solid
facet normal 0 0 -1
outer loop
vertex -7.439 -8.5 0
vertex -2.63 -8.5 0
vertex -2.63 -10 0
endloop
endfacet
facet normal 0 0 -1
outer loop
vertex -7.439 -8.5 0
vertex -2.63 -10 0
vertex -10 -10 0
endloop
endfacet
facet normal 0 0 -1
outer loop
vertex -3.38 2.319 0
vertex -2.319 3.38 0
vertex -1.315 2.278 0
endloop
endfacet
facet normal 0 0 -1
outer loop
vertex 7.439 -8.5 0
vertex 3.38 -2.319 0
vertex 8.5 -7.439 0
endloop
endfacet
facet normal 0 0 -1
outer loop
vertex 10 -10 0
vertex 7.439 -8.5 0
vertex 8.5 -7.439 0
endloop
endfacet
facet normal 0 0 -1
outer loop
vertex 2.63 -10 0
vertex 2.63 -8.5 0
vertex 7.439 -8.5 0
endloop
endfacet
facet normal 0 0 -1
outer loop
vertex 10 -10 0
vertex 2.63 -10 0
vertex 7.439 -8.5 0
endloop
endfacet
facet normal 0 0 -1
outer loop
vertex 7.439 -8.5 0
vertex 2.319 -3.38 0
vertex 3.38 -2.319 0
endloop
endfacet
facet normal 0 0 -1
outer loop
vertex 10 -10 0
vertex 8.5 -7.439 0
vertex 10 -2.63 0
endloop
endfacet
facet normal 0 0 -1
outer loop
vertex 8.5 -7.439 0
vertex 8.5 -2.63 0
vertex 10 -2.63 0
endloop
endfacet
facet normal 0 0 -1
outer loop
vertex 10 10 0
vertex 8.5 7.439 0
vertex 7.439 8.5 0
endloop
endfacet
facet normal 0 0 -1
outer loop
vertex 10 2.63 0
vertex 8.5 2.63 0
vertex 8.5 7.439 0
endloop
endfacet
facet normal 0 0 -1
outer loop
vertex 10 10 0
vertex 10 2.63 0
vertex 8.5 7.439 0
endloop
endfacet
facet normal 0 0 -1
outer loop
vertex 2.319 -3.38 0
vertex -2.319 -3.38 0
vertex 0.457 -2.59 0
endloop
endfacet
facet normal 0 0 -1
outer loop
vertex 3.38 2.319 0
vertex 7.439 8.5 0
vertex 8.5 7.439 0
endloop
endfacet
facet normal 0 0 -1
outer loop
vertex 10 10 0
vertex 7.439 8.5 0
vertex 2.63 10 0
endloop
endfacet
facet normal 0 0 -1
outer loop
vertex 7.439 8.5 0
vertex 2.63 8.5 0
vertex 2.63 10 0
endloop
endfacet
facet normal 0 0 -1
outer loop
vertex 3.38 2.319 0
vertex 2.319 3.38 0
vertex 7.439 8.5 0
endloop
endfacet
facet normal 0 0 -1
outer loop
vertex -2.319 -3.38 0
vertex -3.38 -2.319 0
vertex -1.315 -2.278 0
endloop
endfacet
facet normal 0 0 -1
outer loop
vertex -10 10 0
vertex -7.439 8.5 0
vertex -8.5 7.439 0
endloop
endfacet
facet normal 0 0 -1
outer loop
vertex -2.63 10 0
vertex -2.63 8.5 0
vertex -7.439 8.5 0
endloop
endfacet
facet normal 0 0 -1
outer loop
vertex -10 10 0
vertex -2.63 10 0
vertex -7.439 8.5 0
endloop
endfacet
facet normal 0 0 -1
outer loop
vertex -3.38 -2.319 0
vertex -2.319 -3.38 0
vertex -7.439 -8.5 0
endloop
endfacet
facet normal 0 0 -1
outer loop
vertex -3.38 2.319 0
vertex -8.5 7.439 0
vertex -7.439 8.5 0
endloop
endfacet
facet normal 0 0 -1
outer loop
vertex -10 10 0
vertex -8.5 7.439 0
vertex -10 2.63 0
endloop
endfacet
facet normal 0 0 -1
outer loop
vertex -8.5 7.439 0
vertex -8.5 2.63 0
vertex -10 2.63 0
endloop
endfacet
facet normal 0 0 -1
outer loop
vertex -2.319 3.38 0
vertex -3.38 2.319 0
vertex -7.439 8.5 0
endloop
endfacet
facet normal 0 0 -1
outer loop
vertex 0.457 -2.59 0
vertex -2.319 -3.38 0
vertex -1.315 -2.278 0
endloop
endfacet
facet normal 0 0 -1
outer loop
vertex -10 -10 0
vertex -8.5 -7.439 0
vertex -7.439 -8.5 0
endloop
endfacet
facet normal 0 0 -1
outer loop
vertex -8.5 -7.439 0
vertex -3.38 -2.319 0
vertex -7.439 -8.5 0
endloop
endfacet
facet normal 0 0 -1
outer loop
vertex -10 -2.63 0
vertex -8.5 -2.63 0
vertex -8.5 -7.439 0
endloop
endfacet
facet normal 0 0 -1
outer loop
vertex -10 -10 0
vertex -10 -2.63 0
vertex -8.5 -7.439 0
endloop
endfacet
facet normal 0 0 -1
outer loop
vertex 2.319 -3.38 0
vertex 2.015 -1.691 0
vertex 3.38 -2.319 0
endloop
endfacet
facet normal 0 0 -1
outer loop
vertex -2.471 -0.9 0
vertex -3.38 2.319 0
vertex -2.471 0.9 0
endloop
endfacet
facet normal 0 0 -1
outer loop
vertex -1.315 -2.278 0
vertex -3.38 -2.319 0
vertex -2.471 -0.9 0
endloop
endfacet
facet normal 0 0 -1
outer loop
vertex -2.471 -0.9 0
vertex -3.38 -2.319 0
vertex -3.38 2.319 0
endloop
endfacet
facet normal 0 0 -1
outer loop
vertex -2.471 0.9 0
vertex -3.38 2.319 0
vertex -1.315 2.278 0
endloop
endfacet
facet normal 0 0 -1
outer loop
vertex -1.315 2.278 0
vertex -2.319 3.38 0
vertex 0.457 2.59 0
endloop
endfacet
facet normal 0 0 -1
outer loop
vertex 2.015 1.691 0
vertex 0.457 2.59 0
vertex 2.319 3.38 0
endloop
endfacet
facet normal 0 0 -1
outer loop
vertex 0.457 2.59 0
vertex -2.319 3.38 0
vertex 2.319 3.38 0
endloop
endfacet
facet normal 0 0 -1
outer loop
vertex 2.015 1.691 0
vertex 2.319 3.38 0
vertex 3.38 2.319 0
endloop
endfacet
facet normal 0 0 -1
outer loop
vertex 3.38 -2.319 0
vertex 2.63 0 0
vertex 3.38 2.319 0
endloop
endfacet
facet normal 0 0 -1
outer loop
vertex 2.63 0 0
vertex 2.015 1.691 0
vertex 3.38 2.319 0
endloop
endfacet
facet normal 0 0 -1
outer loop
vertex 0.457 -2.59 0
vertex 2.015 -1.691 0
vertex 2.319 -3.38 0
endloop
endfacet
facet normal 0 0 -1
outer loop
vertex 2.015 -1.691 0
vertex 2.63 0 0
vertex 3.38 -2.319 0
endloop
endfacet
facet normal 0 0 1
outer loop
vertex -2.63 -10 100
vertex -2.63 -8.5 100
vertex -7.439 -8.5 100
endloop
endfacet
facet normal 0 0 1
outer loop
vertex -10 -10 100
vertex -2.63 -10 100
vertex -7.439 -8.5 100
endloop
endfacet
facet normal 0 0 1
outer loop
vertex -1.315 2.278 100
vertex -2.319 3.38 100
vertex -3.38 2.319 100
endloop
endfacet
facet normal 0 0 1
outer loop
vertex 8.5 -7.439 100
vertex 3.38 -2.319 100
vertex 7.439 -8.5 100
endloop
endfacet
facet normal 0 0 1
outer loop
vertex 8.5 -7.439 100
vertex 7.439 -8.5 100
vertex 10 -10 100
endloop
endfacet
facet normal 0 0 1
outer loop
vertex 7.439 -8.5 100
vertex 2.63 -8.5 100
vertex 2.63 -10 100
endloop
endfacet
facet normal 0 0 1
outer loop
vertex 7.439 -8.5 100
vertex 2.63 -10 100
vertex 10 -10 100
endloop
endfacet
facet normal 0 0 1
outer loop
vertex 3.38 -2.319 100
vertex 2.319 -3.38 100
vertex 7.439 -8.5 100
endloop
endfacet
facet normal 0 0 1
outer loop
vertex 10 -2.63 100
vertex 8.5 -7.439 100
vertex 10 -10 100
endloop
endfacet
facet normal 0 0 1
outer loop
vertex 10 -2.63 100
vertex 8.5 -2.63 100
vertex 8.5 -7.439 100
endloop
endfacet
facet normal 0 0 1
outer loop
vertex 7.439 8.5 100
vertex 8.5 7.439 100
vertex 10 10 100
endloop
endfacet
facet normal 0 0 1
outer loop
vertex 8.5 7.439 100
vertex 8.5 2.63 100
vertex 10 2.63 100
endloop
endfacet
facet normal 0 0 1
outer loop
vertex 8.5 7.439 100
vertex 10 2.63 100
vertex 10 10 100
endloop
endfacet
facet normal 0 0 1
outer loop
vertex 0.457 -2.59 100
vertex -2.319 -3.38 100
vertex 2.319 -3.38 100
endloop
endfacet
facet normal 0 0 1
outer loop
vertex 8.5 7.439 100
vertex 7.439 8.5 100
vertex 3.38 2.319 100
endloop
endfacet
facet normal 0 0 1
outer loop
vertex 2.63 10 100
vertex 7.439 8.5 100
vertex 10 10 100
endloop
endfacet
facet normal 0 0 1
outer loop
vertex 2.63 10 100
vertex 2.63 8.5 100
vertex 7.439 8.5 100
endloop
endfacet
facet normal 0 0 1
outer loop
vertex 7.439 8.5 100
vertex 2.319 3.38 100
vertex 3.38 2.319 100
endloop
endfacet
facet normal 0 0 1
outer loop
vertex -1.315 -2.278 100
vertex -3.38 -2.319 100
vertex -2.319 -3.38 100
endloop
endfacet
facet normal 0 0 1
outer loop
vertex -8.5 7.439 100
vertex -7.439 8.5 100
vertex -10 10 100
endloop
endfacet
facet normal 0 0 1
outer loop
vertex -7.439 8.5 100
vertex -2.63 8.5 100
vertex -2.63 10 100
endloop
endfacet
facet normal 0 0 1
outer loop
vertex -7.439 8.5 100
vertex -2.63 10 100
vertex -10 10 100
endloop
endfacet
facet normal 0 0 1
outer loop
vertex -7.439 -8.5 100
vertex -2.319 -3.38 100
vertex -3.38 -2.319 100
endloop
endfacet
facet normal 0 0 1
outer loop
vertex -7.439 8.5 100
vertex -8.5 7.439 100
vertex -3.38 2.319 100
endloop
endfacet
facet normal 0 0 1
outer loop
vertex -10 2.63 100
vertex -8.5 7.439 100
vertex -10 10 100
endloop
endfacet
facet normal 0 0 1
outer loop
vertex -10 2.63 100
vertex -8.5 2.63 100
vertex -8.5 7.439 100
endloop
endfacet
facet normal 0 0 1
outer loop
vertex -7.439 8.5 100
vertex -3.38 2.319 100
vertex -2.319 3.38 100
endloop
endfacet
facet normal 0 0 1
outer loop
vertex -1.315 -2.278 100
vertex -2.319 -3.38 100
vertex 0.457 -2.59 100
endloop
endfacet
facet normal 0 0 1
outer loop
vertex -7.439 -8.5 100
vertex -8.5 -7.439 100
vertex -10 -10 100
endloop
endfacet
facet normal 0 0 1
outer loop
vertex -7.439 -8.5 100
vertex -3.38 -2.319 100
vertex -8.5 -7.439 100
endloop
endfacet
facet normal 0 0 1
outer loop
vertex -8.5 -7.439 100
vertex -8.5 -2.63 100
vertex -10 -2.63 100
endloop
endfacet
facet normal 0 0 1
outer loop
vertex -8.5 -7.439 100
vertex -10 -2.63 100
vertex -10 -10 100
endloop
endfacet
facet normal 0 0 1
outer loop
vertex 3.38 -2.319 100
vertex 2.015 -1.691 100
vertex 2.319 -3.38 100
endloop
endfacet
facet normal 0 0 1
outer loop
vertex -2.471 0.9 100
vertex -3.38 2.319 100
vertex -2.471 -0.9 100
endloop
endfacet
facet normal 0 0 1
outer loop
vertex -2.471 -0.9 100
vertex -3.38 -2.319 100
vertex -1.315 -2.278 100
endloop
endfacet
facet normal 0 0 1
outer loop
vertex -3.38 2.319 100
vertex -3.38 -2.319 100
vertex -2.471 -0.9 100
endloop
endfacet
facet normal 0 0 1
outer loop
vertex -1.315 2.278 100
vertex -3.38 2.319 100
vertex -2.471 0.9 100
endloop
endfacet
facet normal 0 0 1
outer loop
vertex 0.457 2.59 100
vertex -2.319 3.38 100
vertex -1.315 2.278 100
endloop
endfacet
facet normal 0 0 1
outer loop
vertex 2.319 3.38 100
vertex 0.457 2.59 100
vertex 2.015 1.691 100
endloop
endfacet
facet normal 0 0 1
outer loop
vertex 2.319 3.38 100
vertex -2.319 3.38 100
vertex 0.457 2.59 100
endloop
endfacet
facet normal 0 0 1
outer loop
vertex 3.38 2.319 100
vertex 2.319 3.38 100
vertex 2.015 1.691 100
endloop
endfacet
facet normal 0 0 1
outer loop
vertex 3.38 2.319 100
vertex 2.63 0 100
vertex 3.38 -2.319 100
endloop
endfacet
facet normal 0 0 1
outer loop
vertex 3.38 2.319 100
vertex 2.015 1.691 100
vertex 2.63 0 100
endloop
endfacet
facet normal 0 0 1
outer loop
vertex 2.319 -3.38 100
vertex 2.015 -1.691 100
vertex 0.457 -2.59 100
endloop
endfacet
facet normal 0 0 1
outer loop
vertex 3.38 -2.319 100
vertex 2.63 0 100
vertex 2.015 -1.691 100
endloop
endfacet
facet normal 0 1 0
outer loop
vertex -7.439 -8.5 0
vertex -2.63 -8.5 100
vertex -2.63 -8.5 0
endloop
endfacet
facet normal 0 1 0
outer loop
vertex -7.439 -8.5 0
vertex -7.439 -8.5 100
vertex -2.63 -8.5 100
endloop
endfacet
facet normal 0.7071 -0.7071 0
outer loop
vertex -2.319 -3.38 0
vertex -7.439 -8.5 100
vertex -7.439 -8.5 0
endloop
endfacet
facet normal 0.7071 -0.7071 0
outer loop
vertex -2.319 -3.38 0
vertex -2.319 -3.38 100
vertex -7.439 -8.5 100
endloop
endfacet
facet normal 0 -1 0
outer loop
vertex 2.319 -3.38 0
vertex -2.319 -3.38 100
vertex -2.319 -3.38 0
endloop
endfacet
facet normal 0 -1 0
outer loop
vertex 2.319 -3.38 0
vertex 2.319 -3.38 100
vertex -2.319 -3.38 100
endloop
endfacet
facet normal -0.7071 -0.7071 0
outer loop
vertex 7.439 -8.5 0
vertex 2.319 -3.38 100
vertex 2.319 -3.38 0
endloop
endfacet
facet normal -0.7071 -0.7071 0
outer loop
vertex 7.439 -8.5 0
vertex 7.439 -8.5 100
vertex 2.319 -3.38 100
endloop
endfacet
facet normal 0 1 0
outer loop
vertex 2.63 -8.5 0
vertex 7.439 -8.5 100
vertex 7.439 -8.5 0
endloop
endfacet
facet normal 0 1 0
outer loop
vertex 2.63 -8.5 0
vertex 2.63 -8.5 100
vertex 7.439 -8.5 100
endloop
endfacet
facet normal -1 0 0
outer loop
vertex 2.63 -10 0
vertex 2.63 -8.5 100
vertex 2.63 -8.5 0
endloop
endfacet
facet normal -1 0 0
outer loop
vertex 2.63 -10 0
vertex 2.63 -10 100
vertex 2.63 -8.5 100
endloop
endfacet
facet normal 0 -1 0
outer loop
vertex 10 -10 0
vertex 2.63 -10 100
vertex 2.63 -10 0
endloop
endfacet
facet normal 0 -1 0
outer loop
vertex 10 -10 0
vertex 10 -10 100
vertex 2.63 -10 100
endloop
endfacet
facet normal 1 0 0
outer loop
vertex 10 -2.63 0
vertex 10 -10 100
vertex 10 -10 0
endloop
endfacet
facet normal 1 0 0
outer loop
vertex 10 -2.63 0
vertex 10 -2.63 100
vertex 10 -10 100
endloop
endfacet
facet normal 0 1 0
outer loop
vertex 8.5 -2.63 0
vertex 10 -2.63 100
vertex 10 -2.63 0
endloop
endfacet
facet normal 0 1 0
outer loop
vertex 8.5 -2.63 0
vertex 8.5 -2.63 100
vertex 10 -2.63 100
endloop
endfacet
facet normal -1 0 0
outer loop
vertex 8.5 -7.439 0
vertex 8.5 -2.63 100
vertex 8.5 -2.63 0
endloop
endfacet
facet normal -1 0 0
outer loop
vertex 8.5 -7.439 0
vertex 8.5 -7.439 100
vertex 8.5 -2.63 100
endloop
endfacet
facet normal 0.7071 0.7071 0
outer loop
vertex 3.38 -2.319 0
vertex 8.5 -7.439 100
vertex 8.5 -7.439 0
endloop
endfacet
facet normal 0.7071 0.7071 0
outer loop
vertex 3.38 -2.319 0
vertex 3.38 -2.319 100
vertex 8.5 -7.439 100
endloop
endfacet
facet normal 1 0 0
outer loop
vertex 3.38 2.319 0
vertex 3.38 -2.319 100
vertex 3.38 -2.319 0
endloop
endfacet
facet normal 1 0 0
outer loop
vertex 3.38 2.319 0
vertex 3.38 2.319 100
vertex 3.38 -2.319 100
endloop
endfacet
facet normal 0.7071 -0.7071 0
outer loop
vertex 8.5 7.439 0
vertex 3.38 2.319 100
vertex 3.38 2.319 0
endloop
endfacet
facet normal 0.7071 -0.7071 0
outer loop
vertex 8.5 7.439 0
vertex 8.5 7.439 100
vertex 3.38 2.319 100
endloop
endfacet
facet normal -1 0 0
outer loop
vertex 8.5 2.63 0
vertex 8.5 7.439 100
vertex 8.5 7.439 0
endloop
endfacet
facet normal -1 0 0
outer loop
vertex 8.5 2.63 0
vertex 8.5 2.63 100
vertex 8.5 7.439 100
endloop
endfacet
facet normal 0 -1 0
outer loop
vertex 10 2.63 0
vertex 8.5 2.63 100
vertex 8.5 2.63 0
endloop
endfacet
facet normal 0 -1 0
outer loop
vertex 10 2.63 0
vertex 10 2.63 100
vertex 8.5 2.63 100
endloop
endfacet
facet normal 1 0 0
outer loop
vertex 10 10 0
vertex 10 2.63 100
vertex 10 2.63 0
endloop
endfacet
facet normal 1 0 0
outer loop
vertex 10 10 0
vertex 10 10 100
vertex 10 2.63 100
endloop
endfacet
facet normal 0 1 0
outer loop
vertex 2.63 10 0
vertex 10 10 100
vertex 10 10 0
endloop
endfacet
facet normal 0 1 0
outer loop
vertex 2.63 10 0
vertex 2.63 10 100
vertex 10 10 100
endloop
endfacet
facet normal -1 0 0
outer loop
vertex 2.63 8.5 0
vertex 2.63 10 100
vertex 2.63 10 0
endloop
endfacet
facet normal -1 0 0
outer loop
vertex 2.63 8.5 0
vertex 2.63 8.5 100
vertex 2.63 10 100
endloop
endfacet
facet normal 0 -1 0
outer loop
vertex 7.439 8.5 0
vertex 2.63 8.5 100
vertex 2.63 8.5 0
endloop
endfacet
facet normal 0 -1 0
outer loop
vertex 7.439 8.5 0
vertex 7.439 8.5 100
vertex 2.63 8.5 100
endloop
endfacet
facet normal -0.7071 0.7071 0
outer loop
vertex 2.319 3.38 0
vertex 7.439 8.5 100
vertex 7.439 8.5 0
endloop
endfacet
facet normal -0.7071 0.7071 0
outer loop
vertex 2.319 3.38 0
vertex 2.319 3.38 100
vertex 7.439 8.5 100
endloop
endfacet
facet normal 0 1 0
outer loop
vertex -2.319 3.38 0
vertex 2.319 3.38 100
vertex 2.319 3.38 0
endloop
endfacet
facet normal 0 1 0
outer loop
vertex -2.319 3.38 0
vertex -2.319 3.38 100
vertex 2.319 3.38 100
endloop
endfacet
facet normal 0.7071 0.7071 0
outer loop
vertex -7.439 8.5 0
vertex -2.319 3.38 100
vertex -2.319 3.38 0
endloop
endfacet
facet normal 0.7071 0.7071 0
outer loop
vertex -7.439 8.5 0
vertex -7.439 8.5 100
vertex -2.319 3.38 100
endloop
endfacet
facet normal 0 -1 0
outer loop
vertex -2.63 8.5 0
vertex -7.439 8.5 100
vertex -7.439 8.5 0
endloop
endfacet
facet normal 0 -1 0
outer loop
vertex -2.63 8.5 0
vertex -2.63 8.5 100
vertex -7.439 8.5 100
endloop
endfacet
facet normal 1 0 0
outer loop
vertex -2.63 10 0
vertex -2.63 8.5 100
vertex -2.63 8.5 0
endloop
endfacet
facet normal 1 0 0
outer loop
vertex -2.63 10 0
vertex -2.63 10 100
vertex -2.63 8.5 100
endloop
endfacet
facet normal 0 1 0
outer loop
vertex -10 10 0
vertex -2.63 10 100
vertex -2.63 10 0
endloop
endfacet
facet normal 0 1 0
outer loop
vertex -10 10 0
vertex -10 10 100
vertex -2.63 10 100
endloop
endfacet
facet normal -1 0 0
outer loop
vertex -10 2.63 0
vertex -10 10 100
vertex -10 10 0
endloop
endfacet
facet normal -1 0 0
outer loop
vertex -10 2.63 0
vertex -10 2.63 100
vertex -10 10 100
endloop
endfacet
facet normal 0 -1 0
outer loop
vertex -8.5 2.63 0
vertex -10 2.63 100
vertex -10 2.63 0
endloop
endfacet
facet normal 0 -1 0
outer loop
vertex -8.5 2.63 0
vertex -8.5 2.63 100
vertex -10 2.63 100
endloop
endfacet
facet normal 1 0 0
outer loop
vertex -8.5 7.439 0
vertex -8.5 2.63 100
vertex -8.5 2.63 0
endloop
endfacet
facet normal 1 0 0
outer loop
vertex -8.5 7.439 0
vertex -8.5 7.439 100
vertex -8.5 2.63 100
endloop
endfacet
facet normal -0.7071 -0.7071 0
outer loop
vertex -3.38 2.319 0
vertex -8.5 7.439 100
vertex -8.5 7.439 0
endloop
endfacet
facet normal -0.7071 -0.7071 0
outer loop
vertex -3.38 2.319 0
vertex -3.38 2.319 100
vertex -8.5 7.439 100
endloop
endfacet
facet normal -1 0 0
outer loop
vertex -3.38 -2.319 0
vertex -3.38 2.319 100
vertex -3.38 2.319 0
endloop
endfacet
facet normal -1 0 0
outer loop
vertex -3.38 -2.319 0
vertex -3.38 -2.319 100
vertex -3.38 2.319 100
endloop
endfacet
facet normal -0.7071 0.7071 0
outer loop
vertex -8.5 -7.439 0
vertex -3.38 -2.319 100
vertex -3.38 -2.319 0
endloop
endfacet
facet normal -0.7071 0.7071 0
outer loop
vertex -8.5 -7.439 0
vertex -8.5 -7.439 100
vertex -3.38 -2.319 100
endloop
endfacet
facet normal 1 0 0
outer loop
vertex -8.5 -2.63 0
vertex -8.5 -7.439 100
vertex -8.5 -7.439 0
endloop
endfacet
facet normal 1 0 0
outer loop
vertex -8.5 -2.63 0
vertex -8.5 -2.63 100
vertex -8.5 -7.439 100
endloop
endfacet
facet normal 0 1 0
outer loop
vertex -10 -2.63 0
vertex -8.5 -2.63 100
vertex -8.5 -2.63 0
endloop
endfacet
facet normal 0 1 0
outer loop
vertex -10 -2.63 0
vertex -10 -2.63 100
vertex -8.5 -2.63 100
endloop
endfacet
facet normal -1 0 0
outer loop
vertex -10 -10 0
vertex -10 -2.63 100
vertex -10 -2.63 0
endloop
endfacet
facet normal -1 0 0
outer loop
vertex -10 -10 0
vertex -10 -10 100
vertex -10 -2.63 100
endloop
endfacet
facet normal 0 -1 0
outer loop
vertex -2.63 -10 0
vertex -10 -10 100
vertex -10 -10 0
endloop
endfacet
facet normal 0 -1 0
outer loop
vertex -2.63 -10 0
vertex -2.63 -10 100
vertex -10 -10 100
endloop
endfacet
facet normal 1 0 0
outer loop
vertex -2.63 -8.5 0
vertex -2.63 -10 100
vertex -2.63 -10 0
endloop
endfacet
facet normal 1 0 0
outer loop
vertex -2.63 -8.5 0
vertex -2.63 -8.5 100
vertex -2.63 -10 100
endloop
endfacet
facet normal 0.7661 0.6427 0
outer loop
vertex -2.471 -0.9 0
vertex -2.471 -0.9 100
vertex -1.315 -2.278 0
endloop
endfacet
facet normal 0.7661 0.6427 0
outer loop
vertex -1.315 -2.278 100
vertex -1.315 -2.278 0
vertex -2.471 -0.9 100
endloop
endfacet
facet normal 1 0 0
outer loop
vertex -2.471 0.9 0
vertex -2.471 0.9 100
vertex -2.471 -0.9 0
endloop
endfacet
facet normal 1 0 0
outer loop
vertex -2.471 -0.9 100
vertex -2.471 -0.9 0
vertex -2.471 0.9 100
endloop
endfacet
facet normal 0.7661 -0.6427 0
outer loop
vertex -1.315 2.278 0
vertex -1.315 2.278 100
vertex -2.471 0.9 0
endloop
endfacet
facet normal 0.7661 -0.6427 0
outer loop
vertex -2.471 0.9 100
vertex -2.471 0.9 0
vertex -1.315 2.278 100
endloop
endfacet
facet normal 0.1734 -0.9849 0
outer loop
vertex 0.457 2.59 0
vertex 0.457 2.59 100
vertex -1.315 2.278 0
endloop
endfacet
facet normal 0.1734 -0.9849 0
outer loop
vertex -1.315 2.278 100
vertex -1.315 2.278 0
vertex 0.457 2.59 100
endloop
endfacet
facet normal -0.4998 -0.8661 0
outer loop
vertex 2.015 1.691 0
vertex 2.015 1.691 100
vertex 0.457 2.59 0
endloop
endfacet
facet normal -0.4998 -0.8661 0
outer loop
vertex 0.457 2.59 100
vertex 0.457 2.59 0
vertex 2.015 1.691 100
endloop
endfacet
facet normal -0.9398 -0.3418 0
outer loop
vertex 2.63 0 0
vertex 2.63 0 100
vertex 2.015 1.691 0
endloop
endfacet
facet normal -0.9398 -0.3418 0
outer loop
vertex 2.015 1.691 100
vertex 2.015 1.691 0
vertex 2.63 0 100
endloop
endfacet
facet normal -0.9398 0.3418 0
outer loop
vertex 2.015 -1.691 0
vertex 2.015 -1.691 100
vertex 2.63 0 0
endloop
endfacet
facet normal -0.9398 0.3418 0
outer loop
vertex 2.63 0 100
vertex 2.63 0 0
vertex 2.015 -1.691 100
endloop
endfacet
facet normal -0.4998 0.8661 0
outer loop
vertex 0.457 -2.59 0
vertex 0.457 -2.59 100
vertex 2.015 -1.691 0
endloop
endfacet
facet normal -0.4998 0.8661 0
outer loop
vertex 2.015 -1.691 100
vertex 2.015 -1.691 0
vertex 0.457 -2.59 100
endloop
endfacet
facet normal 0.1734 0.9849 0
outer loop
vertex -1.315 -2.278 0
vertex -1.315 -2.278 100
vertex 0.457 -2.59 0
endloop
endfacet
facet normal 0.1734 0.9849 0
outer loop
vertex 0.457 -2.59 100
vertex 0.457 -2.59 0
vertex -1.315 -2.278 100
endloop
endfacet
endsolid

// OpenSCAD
// *****************************************************************
// Eldersoft
// Ward M. Elder
// Jan 21, 2012
// *****************************************************************
// Portions by:
//	(C) Nathan Zadoks 2011
//	CC-BY-SA or GPLv2, pick your poison.
// *****************************************************************


// *****************************************************************
// Create an Extrusion
//
//	Call:			tslot_build(dimension,xcount,ycount,length)
//
//	dimension 		= size of the extrusion in mm (default = 20)
//	xcount		= number of extrusions to make in the x direction (default =1)
//	ycount		= number of extrusions to make in the y direction (default =1)
//	length		= length of the extrusion in mm (default=100)
//
//
// Create a Nut for your extrusions
//
//	Call:			nut(length,dimension,bolt_diameter,nut_diameter,nut_thickness)
//
//	length 		= total lenght of the nut (default=10)
//	dimension 		= size of the extrusion you will be using this nut on (default=20)
//	bolt_diameter	= bolt hole size in mm (default = 4 = M4 bolt)
//	nut_diameter	= size of the nut (default = 7.8 = M4 nut)
//	nut_thickness	= thickness of the nut (default = 3.2 = M4 nut)
// *****************************************************************



// *****************************************************************
//    START OF CODE
// *****************************************************************

// *****************************************************************
// Extrusion module
// *****************************************************************
// dimension is in millimeters
// xcount and ycount are multiples of "dimension" extrusions
// *****************************************************************

module tslot_build(
	dimension=20,
	xcount=1,
	ycount=1,
	length=100,
	center=false
){
	translate([-(xcount-1)*dimension/2,-(ycount-1)*dimension/2,0])
		union(){
			for(x=[0:xcount-1]) {
				for(y=[0:ycount-1]){ 
					translate([dimension*x-dimension,dimension*y-dimension,0])
						tslot(size=dimension,gap=2.63*(dimension/10),thickness=.75*(dimension/10),length=length,center=center);
				}
			}
		}
}


// *****************************************************************
// TSlot module
// *****************************************************************
//	(C) Nathan Zadoks 2011
//	CC-BY-SA or GPLv2, pick your poison.
// Modified by:
// 	Eldersoft
// 	Ward M. Elder
// 	Jan 21, 2012
// *****************************************************************

module tslot(
	size=10,		//size of each side
	length=10,		//length. descriptive enough, no?
	thickness=3,	//thickness of the 'sheet'
	gap=0,		//gap, thickness of the lower part of the 'T'
	center=false	//somewhat vague. todo.
){
	start=thickness/sqrt(2);
	color([0.5,0.5,0.5])
		linear_extrude(height=length,center=center)
			translate([size,size])
				difference(){
					union(){
						for(d=[0:3])
							rotate([0,0,d*90]) 
								polygon(points=[
									[0,				0],
									[0,				start],
									[size/2-thickness-start,	size/2-thickness],
									[gap/2,			size/2-thickness],
									[gap/2,			size/2],
									[size/2,			size/2],
									[size/2,			gap/2],
									[size/2-thickness,		gap/2],
									[size/2-thickness,		size/2-thickness-start],
									[start,			0]
							]);
						square(gap+thickness,center=true);
					}
					circle(r=gap/2,center=true);
				}
}


// *****************************************************************
// Nut module
// *****************************************************************
//	 (C) Nathan Zadoks 2011
// Modified by:
// 	Eldersoft
// 	Ward M. Elder
// 	Jan 21, 2012
// *****************************************************************


module nut(
	length=10,						//length of nut
	dimension=20,					//dimension of extrusion we will use the nut on

	bolt_diameter=4,					// M4 Bolt
	nut_diameter=7.8,				// M4 Nut
	nut_thickness=3.2				// M4 Nut
){

	width=6.5*(dimension/10);			//width at widest point.  with of top par tof the 'T'
	gapwidth=2.5*(dimension/10);			//gap width.  thickness of the lower part of the 'T'
	overhange = (width - gapwidth)/2;		//width of overhange
	pointdepth=2.25*(dimension/10);		//depth of top part of the 'T'
	gapdepth=.75*(dimension/10);		//depth of lower part of the 'T'	


	color([0.5,0.5,0.5]){
		translate([0,0,length/2])
			difference(){
				linear_extrude(height=length,center=true){
					intersection(){
						polygon([
							[-(width/2-overhange),				-(gapdepth+pointdepth)/2],
							[-(width/2-overhange),				gapdepth-(gapdepth+pointdepth)/2],
							[-(width/2),						gapdepth-(gapdepth+pointdepth)/2],
							[0,							(dimension/2-2)-(gapdepth+pointdepth)/2],	
							[width/2,						gapdepth-(gapdepth+pointdepth)/2],
							[width/2-overhange,				gapdepth-(gapdepth+pointdepth)/2],
							[width/2-overhange,				-(gapdepth+pointdepth)/2]
							]);
						square([width*2,	pointdepth+gapdepth],center=true);  // used to make the flat Point
					}
				}
				rotate(a=[90,0,0])
					cylinder(h=gapdepth+pointdepth+1,r=(bolt_diameter/2)*1.20,$fn=30,center=true);
				rotate([90,0,0])
					translate([0,0,-(gapdepth)+.1])
						rotate([0,0,90])
							cylinder(h=pointdepth+1,r=(nut_diameter/2)*1.20,$fn=6,center=true);
			}
	}
}	


// *****************************************************************
// Predifined common sizes
// *****************************************************************
// 20mm based
// 2020 = 20mm x 20mm
// 2040 = 20mm x 40mm
// 4040 = 40mm x 40mm
// 4080 = 40mm x 80mm
// *****************************************************************

module tslot2020(length,center=false){
	tslot_build(20,1,1,length,center=center);
}
module tslot2040(length,center=false){
	tslot_build(20,1,2,length,center=center);
}
module tslot4040(length,center=false){
	tslot_build(20,2,2,length,center=center);
}
module tslot4080(length,center=false){
	tslot_build(20,2,4,length,center=center);
}


// *****************************************************************
//     END OF CODE
// *****************************************************************


// *****************************************************************
// Add your own calls or uncomment one of the folowing examples 
// *****************************************************************


// Examples:

// *****************************************************************
// 20mm extrusion size with 1 x 1 extrusions wide and deep, 100mm long
//	Also called a 2020
// *****************************************************************
//tslot_build(20,1,1,100);


// *****************************************************************
// 20mm extrusion size with 2 x 4 extrusions wide and deep, 100mm long
//	Also called a 4080
// *****************************************************************
//tslot_build(20,2,4,100);


// *****************************************************************
// Use predifined 2020
// 	20mm x 20mm x 100mm long
// *****************************************************************
tslot2020(100);


// *****************************************************************
// Use predifined 2040
// 	20mm x 40mm x 100mm long
// *****************************************************************
//tslot4080(100, true);


// *****************************************************************
// Create a Nut
// *****************************************************************
//nut(length=15,dimension=20);
